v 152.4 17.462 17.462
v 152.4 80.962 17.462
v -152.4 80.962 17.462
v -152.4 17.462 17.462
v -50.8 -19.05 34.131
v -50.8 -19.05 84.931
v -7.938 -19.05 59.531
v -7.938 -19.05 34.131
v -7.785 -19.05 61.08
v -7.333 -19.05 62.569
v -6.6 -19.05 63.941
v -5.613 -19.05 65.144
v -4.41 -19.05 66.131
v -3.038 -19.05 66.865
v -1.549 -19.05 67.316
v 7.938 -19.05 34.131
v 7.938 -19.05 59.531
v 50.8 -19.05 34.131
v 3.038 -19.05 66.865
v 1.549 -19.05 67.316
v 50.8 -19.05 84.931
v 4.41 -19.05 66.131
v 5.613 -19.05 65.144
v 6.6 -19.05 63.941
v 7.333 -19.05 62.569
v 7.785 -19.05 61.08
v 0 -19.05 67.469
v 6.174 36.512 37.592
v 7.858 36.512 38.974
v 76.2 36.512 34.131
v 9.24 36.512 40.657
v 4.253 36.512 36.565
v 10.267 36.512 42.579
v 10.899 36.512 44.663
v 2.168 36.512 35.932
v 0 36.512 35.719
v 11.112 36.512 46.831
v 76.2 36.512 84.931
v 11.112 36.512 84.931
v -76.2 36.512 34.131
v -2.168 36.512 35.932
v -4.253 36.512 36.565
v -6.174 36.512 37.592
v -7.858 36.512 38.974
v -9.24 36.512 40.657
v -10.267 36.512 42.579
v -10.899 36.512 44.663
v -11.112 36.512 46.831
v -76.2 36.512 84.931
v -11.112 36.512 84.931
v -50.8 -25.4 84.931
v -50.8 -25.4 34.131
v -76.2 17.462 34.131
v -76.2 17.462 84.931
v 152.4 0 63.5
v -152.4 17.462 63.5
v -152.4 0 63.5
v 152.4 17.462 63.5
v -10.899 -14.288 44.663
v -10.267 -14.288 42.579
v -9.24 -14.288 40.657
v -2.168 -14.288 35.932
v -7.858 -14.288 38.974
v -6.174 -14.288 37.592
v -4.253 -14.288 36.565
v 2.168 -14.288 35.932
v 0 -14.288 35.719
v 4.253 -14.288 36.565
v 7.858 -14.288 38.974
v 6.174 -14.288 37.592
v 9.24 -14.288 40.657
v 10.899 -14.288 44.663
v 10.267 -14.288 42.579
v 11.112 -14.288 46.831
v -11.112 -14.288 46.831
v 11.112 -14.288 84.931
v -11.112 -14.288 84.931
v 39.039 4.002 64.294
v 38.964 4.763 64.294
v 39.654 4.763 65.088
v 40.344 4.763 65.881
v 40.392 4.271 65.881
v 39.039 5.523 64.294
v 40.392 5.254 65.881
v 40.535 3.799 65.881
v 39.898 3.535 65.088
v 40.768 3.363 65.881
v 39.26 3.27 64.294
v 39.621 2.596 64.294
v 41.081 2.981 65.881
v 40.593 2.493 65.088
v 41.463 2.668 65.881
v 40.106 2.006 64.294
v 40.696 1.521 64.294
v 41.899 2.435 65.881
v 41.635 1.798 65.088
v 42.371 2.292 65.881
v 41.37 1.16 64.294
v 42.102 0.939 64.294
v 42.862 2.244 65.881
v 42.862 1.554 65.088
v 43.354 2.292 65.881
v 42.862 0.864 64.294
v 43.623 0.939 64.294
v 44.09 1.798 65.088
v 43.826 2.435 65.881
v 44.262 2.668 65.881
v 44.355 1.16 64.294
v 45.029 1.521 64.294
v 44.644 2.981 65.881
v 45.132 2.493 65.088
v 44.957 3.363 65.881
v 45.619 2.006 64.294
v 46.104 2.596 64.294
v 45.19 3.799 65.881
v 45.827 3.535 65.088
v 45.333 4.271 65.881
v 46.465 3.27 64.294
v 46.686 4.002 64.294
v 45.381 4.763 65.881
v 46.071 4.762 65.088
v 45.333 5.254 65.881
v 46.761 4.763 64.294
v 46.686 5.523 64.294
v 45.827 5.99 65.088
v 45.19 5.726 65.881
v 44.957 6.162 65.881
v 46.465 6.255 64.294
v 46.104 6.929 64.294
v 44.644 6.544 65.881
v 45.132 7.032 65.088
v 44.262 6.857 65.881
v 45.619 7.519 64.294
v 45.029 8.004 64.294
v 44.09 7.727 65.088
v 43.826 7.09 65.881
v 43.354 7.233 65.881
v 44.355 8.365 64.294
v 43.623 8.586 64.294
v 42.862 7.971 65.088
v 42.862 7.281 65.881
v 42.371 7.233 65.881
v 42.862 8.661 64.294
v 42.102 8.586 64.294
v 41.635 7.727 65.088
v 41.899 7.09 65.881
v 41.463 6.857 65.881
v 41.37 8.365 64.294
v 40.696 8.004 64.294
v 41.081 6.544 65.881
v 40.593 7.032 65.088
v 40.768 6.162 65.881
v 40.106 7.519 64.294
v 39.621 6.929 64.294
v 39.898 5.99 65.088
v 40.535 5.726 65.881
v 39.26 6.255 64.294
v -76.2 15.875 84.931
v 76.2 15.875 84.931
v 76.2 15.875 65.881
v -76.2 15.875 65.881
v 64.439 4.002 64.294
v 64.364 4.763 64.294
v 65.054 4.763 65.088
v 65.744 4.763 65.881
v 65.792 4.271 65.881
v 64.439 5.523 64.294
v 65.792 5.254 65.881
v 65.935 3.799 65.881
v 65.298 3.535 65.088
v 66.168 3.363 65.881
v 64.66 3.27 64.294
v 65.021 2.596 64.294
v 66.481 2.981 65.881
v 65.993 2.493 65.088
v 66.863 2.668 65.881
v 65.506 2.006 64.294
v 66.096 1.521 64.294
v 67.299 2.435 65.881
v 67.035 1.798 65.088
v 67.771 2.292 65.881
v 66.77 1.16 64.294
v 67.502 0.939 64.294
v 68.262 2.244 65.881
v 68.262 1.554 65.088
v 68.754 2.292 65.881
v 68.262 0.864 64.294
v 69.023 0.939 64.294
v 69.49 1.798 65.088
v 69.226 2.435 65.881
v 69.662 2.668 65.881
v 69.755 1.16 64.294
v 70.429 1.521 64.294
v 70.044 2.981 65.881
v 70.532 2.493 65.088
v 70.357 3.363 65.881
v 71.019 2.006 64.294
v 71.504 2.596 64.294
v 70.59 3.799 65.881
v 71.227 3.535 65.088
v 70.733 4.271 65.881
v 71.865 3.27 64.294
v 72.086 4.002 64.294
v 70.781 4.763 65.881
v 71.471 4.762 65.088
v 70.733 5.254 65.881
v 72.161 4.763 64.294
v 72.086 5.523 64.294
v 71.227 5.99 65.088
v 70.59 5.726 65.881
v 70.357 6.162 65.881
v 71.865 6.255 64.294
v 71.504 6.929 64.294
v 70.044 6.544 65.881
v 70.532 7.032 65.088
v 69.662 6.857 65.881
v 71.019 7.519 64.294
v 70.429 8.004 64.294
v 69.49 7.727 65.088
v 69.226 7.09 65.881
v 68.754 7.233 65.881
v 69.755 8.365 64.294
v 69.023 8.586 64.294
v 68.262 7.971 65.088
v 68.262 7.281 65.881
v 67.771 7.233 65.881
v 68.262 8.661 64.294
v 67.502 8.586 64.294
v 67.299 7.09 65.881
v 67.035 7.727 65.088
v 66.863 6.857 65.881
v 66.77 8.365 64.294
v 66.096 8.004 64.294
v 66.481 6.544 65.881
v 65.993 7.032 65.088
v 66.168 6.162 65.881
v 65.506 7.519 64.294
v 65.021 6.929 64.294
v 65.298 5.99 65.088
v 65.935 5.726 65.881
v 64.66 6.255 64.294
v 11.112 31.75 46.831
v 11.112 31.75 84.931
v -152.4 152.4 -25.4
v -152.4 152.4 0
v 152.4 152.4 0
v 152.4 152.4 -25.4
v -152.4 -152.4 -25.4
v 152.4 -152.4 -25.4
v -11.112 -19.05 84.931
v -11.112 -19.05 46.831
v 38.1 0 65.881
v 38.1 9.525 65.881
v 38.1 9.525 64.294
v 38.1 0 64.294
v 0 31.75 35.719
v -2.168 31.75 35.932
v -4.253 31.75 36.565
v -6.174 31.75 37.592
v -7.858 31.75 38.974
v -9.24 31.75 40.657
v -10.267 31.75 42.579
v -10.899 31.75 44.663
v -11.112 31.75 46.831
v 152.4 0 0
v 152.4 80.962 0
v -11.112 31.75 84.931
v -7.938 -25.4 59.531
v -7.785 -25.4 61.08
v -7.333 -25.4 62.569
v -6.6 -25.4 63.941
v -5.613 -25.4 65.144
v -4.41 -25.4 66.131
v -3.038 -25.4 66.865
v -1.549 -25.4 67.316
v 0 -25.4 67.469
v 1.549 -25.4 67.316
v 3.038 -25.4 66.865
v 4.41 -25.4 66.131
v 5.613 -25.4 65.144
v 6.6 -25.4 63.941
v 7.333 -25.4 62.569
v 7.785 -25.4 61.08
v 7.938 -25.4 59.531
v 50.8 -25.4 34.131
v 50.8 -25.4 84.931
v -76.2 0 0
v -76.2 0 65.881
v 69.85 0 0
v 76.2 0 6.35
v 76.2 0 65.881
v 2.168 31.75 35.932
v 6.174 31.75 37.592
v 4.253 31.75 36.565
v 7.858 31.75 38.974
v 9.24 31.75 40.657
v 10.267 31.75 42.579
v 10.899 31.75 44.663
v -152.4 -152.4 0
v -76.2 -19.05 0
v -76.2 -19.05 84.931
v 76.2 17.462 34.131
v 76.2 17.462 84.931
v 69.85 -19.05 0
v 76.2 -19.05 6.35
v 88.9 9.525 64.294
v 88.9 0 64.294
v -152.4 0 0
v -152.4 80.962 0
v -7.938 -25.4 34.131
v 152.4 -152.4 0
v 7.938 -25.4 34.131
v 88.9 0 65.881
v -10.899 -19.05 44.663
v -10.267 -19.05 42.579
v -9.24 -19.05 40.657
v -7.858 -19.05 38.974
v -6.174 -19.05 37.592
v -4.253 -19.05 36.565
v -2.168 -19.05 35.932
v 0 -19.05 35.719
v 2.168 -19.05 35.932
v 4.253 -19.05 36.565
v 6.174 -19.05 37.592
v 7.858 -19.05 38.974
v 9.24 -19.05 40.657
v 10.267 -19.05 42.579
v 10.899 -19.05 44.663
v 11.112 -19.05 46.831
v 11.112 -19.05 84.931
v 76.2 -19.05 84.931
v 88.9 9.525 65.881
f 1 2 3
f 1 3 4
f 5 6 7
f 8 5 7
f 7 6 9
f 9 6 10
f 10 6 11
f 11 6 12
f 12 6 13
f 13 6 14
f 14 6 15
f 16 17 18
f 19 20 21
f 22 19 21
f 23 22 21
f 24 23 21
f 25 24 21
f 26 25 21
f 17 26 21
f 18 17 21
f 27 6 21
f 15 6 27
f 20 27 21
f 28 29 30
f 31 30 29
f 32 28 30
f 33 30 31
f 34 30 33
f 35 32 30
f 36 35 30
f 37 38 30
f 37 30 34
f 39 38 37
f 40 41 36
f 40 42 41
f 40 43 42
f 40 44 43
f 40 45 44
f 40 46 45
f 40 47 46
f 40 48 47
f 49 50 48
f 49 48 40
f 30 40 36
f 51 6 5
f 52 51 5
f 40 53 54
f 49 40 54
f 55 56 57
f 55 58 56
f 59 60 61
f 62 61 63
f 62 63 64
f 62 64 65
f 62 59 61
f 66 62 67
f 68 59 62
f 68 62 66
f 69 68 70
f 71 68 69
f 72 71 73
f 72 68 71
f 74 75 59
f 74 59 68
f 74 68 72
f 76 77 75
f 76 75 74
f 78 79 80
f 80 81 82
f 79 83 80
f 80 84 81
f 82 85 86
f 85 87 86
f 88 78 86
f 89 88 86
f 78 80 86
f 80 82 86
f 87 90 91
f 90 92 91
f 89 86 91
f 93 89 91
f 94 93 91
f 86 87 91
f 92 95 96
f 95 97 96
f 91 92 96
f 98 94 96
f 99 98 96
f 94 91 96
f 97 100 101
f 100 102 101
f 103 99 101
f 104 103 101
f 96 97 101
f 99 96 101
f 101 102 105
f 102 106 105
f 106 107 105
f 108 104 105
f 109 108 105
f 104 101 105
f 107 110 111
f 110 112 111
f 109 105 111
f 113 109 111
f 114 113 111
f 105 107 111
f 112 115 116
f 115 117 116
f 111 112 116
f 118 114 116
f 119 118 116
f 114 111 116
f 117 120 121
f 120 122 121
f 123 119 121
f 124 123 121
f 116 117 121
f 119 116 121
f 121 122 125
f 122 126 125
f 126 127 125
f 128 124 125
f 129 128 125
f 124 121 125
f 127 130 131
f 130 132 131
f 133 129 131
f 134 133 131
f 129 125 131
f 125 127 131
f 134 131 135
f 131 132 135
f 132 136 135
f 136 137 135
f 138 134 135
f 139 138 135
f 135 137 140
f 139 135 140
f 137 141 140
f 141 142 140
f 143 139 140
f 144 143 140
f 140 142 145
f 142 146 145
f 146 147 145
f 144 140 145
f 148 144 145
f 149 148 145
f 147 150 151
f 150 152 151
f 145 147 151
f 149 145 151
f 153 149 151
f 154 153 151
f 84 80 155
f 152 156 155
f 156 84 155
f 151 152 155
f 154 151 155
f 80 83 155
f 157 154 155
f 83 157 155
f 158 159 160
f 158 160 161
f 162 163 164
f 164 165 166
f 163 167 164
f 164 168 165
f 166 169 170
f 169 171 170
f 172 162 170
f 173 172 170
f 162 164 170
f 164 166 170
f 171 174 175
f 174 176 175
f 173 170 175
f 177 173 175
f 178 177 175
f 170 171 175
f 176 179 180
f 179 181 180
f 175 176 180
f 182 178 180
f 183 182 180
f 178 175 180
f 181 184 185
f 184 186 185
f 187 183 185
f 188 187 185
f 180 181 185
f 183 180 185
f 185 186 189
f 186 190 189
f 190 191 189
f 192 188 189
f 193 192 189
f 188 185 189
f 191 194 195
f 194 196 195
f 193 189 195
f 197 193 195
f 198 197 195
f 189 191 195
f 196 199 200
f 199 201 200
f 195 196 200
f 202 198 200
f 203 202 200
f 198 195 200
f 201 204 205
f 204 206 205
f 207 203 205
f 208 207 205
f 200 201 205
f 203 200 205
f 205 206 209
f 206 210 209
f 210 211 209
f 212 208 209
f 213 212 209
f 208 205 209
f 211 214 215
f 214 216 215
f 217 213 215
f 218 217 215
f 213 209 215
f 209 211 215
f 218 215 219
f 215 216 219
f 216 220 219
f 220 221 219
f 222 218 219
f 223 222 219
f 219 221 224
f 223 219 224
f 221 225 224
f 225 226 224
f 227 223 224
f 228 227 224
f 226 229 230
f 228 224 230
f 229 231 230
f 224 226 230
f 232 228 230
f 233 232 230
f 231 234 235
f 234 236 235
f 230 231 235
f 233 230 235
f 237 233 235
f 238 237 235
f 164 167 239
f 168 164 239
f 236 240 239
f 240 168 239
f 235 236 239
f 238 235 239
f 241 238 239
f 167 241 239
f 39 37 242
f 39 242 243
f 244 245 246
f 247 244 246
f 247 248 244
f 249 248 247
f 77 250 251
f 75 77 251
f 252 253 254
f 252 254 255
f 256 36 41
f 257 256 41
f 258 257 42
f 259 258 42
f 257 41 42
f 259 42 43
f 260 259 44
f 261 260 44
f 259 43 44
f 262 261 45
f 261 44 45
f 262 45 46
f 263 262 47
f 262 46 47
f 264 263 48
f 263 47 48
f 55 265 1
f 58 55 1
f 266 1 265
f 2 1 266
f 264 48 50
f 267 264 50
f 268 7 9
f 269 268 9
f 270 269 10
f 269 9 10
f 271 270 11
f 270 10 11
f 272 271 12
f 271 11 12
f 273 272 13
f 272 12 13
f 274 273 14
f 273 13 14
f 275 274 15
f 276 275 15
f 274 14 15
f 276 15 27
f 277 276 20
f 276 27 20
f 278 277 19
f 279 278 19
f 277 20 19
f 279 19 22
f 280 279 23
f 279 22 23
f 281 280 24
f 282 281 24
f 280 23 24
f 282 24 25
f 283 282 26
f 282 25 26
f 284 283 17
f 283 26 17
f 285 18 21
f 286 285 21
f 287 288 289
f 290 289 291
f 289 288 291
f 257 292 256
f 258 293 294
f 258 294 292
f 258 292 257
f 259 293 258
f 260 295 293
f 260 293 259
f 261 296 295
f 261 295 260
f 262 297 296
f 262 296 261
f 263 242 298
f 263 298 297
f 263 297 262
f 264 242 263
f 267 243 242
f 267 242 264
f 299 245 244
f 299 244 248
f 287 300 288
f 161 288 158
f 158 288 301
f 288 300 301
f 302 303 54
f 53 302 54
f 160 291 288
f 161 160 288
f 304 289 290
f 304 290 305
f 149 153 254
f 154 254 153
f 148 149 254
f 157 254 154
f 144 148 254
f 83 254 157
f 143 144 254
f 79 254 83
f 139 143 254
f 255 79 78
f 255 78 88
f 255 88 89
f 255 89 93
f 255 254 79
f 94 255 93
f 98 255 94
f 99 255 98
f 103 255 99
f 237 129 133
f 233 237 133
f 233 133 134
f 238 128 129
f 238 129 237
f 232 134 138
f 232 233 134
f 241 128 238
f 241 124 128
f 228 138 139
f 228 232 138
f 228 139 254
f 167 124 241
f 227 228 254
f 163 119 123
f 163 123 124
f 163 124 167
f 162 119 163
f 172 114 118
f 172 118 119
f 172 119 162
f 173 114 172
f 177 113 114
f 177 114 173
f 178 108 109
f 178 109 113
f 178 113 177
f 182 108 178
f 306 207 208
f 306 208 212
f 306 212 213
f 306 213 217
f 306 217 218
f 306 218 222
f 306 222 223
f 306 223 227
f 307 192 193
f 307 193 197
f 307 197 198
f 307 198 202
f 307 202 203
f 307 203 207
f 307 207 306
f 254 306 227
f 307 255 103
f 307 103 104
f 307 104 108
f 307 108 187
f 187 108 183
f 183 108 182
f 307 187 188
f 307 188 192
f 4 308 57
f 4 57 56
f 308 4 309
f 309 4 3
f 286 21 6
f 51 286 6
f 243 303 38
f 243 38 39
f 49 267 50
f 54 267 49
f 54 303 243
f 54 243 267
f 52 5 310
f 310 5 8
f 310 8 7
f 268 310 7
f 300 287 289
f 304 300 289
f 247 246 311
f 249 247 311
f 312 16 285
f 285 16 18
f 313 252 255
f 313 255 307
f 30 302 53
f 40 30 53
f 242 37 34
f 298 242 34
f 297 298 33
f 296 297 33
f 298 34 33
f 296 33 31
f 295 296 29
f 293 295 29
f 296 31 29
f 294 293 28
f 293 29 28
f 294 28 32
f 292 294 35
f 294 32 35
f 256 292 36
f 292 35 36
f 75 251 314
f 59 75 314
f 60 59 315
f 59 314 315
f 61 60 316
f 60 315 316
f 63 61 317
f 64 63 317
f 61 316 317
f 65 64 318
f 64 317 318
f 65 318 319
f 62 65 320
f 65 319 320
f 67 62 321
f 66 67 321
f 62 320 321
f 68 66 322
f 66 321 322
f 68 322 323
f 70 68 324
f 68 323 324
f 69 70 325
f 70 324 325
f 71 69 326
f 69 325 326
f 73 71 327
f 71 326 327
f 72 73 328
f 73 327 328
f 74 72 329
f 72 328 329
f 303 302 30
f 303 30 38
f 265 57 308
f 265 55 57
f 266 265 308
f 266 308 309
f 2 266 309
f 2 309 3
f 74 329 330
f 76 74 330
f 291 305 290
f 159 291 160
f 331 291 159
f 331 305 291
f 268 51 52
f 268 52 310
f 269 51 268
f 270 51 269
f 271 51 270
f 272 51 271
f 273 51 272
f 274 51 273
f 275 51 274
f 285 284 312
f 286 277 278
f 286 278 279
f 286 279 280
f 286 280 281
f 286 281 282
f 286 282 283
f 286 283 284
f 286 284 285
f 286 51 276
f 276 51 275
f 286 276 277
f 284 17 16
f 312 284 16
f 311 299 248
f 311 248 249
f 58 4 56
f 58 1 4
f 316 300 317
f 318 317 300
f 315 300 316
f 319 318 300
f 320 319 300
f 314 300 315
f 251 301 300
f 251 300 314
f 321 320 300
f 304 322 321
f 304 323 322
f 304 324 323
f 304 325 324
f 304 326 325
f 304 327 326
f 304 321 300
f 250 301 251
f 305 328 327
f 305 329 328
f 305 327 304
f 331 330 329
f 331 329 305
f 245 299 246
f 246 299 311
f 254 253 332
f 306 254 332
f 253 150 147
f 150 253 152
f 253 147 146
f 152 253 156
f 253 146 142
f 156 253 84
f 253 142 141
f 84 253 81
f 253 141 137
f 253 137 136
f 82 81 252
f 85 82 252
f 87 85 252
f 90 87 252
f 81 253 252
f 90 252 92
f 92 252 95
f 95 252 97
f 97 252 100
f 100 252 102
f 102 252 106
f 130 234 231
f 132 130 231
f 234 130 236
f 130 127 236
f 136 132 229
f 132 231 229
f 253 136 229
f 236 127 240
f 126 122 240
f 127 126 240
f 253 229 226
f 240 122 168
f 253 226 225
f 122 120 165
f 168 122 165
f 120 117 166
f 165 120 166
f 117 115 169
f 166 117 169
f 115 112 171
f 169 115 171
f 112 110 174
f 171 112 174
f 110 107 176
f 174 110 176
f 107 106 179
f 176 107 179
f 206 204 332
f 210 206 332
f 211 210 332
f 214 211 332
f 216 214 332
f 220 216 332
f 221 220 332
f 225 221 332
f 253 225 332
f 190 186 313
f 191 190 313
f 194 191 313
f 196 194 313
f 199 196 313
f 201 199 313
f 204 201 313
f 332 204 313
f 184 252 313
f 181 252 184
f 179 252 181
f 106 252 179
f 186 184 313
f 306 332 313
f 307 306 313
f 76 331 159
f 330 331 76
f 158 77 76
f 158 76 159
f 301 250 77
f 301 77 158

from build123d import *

# Parameters (mm, degrees)
F1_DEPTH        = 152.4
F2_W            = 304.8
F2_H            = 304.8
F3_DEPTH        = 25.4
F4_W            = 152.4
F4_H            = 84.93125
F5_DEPTH        = 19.05
F6_W            = 152.4
F6_H            = 19.05
F7_DEPTH        = 15.875
F8_W            = 152.4
F8_H            = 50.8
F9_DEPTH        = 19.05
F10_SIZE        = 6.35
F11_W           = 50.8
F11_H           = 9.525
F12_DEPTH       = 1.5875
F14_D           = 3.7973
F14_CSINK_D     = 7.7978
F14_CSINK_ANGLE = 82
F16_DEPTH       = 4.7625
F17_W           = 11.1125
F17_H           = 38.1
F18_DEPTH       = 4.7625
F20_DEPTH       = 6.35


with BuildPart() as f1:
    # F0 (on Right) → F1 (new body, symmetric)
    with BuildSketch(Plane.YZ):
        Polygon((0, 63.5), (0, 0), (80.9625, 0), (80.9625, 17.4625), (17.4625, 17.4625), (17.4625, 63.5), align=None)
    extrude(amount=F1_DEPTH, both=True)


with BuildPart() as f3:
    # F2 (on face) → F3 (new body)
    with BuildSketch(Plane(origin=(0, 0, 0), x_dir=(1, 0, 0), z_dir=(0, 0, -1))):
        Rectangle(F2_W, F2_H)
    extrude(amount=F3_DEPTH)


with BuildPart() as f5:
    # F4 (on face) → F5 (new body)
    with BuildSketch(Plane.XZ):
        with Locations((0, 42.465625)):
            Rectangle(F4_W, F4_H)
    extrude(amount=F5_DEPTH)

    # F6 (on face) → F7 (join)
    with BuildSketch(Plane(origin=(0, 0, 0), x_dir=(-1, 0, 0), z_dir=(0, 1, 0))):
        with Locations((0, 75.40625)):
            Rectangle(F6_W, F6_H)
    extrude(amount=F7_DEPTH)

    # F10
    f10_edges = [f5.edges().sort_by_distance(p)[0] for p in [
        (76.2, -9.525, 0),
    ]]
    chamfer(f10_edges, length=F10_SIZE)

    # F15 (on face) → F16 (cut)
    with BuildSketch(Plane.XZ.offset(19.05)):
        with BuildLine():
            Line((11.1125, 84.93125), (-11.1125, 84.93125))
            Line((-11.1125, 84.93125), (-11.1125, 46.83125))
            ThreePointArc((-11.1125, 46.83125), (0, 35.71875), (11.1125, 46.83125))
            Line((11.1125, 46.83125), (11.1125, 84.93125))
        make_face()
    extrude(amount=-F16_DEPTH, mode=Mode.SUBTRACT)


with BuildPart() as f9:
    # F8 (on face) → F9 (new body)
    with BuildSketch(Plane(origin=(0, 17.4625, 0), x_dir=(-1, 0, 0), z_dir=(0, 1, 0))):
        with Locations((0, 59.53125)):
            Rectangle(F8_W, F8_H)
    extrude(amount=F9_DEPTH)

    # F17 (on face) → F18 (cut)
    with BuildSketch(Plane(origin=(0, 36.5125, 0), x_dir=(-1, 0, 0), z_dir=(0, 1, 0))):
        with Locations((5.55625, 65.88125)):
            Rectangle(F17_W, F17_H)
        with Locations((-5.55625, 65.88125)):
            Rectangle(F17_W, F17_H)
        with BuildLine():
            ThreePointArc((0, 35.71875), (7.8577241059, 38.9735258941), (11.1125, 46.83125))
            Line((11.1125, 46.83125), (0, 46.83125))
            Line((0, 46.83125), (0, 35.71875))
        make_face()
        with BuildLine():
            Line((0, 35.71875), (0, 46.83125))
            Line((0, 46.83125), (-11.1125, 46.83125))
            ThreePointArc((-11.1125, 46.83125), (-7.8577241059, 38.9735258941), (0, 35.71875))
        make_face()
    extrude(amount=-F18_DEPTH, mode=Mode.SUBTRACT)


with BuildPart() as f12:
    # F11 (on face) → F12 (new body)
    with BuildSketch(Plane(origin=(0, 0, 65.88125), x_dir=(1, 0, 0), z_dir=(0, 0, -1))):
        with Locations((63.5, -4.7625)):
            Rectangle(F11_W, F11_H)
    extrude(amount=F12_DEPTH)

    # F14 (through all)
    with Locations(Plane(origin=(0, 0, 64.29375), x_dir=(1, 0, 0), z_dir=(0, 0, -1))):
        with Locations((42.8625, -4.7625), (68.2625, -4.7625)):
            CounterSinkHole(F14_D / 2, F14_CSINK_D / 2, counter_sink_angle=F14_CSINK_ANGLE)


with BuildPart() as f20:
    # F19 (on face) → F20 (new body)
    with BuildSketch(Plane.XZ.offset(19.05)):
        with BuildLine():
            Line((50.8, 34.13125), (50.8, 84.93125))
            Line((50.8, 84.93125), (-50.8, 84.93125))
            Line((-50.8, 84.93125), (-50.8, 34.13125))
            Line((-50.8, 34.13125), (-7.9375, 34.13125))
            Line((-7.9375, 34.13125), (-7.9375, 59.53125))
            ThreePointArc((-7.9375, 59.53125), (0, 67.46875), (7.9375, 59.53125))
            Line((7.9375, 59.53125), (7.9375, 34.13125))
            Line((7.9375, 34.13125), (50.8, 34.13125))
        make_face()
    extrude(amount=F20_DEPTH)


solid = Compound([f1.part, f3.part, f5.part, f9.part, f12.part, f20.part])
